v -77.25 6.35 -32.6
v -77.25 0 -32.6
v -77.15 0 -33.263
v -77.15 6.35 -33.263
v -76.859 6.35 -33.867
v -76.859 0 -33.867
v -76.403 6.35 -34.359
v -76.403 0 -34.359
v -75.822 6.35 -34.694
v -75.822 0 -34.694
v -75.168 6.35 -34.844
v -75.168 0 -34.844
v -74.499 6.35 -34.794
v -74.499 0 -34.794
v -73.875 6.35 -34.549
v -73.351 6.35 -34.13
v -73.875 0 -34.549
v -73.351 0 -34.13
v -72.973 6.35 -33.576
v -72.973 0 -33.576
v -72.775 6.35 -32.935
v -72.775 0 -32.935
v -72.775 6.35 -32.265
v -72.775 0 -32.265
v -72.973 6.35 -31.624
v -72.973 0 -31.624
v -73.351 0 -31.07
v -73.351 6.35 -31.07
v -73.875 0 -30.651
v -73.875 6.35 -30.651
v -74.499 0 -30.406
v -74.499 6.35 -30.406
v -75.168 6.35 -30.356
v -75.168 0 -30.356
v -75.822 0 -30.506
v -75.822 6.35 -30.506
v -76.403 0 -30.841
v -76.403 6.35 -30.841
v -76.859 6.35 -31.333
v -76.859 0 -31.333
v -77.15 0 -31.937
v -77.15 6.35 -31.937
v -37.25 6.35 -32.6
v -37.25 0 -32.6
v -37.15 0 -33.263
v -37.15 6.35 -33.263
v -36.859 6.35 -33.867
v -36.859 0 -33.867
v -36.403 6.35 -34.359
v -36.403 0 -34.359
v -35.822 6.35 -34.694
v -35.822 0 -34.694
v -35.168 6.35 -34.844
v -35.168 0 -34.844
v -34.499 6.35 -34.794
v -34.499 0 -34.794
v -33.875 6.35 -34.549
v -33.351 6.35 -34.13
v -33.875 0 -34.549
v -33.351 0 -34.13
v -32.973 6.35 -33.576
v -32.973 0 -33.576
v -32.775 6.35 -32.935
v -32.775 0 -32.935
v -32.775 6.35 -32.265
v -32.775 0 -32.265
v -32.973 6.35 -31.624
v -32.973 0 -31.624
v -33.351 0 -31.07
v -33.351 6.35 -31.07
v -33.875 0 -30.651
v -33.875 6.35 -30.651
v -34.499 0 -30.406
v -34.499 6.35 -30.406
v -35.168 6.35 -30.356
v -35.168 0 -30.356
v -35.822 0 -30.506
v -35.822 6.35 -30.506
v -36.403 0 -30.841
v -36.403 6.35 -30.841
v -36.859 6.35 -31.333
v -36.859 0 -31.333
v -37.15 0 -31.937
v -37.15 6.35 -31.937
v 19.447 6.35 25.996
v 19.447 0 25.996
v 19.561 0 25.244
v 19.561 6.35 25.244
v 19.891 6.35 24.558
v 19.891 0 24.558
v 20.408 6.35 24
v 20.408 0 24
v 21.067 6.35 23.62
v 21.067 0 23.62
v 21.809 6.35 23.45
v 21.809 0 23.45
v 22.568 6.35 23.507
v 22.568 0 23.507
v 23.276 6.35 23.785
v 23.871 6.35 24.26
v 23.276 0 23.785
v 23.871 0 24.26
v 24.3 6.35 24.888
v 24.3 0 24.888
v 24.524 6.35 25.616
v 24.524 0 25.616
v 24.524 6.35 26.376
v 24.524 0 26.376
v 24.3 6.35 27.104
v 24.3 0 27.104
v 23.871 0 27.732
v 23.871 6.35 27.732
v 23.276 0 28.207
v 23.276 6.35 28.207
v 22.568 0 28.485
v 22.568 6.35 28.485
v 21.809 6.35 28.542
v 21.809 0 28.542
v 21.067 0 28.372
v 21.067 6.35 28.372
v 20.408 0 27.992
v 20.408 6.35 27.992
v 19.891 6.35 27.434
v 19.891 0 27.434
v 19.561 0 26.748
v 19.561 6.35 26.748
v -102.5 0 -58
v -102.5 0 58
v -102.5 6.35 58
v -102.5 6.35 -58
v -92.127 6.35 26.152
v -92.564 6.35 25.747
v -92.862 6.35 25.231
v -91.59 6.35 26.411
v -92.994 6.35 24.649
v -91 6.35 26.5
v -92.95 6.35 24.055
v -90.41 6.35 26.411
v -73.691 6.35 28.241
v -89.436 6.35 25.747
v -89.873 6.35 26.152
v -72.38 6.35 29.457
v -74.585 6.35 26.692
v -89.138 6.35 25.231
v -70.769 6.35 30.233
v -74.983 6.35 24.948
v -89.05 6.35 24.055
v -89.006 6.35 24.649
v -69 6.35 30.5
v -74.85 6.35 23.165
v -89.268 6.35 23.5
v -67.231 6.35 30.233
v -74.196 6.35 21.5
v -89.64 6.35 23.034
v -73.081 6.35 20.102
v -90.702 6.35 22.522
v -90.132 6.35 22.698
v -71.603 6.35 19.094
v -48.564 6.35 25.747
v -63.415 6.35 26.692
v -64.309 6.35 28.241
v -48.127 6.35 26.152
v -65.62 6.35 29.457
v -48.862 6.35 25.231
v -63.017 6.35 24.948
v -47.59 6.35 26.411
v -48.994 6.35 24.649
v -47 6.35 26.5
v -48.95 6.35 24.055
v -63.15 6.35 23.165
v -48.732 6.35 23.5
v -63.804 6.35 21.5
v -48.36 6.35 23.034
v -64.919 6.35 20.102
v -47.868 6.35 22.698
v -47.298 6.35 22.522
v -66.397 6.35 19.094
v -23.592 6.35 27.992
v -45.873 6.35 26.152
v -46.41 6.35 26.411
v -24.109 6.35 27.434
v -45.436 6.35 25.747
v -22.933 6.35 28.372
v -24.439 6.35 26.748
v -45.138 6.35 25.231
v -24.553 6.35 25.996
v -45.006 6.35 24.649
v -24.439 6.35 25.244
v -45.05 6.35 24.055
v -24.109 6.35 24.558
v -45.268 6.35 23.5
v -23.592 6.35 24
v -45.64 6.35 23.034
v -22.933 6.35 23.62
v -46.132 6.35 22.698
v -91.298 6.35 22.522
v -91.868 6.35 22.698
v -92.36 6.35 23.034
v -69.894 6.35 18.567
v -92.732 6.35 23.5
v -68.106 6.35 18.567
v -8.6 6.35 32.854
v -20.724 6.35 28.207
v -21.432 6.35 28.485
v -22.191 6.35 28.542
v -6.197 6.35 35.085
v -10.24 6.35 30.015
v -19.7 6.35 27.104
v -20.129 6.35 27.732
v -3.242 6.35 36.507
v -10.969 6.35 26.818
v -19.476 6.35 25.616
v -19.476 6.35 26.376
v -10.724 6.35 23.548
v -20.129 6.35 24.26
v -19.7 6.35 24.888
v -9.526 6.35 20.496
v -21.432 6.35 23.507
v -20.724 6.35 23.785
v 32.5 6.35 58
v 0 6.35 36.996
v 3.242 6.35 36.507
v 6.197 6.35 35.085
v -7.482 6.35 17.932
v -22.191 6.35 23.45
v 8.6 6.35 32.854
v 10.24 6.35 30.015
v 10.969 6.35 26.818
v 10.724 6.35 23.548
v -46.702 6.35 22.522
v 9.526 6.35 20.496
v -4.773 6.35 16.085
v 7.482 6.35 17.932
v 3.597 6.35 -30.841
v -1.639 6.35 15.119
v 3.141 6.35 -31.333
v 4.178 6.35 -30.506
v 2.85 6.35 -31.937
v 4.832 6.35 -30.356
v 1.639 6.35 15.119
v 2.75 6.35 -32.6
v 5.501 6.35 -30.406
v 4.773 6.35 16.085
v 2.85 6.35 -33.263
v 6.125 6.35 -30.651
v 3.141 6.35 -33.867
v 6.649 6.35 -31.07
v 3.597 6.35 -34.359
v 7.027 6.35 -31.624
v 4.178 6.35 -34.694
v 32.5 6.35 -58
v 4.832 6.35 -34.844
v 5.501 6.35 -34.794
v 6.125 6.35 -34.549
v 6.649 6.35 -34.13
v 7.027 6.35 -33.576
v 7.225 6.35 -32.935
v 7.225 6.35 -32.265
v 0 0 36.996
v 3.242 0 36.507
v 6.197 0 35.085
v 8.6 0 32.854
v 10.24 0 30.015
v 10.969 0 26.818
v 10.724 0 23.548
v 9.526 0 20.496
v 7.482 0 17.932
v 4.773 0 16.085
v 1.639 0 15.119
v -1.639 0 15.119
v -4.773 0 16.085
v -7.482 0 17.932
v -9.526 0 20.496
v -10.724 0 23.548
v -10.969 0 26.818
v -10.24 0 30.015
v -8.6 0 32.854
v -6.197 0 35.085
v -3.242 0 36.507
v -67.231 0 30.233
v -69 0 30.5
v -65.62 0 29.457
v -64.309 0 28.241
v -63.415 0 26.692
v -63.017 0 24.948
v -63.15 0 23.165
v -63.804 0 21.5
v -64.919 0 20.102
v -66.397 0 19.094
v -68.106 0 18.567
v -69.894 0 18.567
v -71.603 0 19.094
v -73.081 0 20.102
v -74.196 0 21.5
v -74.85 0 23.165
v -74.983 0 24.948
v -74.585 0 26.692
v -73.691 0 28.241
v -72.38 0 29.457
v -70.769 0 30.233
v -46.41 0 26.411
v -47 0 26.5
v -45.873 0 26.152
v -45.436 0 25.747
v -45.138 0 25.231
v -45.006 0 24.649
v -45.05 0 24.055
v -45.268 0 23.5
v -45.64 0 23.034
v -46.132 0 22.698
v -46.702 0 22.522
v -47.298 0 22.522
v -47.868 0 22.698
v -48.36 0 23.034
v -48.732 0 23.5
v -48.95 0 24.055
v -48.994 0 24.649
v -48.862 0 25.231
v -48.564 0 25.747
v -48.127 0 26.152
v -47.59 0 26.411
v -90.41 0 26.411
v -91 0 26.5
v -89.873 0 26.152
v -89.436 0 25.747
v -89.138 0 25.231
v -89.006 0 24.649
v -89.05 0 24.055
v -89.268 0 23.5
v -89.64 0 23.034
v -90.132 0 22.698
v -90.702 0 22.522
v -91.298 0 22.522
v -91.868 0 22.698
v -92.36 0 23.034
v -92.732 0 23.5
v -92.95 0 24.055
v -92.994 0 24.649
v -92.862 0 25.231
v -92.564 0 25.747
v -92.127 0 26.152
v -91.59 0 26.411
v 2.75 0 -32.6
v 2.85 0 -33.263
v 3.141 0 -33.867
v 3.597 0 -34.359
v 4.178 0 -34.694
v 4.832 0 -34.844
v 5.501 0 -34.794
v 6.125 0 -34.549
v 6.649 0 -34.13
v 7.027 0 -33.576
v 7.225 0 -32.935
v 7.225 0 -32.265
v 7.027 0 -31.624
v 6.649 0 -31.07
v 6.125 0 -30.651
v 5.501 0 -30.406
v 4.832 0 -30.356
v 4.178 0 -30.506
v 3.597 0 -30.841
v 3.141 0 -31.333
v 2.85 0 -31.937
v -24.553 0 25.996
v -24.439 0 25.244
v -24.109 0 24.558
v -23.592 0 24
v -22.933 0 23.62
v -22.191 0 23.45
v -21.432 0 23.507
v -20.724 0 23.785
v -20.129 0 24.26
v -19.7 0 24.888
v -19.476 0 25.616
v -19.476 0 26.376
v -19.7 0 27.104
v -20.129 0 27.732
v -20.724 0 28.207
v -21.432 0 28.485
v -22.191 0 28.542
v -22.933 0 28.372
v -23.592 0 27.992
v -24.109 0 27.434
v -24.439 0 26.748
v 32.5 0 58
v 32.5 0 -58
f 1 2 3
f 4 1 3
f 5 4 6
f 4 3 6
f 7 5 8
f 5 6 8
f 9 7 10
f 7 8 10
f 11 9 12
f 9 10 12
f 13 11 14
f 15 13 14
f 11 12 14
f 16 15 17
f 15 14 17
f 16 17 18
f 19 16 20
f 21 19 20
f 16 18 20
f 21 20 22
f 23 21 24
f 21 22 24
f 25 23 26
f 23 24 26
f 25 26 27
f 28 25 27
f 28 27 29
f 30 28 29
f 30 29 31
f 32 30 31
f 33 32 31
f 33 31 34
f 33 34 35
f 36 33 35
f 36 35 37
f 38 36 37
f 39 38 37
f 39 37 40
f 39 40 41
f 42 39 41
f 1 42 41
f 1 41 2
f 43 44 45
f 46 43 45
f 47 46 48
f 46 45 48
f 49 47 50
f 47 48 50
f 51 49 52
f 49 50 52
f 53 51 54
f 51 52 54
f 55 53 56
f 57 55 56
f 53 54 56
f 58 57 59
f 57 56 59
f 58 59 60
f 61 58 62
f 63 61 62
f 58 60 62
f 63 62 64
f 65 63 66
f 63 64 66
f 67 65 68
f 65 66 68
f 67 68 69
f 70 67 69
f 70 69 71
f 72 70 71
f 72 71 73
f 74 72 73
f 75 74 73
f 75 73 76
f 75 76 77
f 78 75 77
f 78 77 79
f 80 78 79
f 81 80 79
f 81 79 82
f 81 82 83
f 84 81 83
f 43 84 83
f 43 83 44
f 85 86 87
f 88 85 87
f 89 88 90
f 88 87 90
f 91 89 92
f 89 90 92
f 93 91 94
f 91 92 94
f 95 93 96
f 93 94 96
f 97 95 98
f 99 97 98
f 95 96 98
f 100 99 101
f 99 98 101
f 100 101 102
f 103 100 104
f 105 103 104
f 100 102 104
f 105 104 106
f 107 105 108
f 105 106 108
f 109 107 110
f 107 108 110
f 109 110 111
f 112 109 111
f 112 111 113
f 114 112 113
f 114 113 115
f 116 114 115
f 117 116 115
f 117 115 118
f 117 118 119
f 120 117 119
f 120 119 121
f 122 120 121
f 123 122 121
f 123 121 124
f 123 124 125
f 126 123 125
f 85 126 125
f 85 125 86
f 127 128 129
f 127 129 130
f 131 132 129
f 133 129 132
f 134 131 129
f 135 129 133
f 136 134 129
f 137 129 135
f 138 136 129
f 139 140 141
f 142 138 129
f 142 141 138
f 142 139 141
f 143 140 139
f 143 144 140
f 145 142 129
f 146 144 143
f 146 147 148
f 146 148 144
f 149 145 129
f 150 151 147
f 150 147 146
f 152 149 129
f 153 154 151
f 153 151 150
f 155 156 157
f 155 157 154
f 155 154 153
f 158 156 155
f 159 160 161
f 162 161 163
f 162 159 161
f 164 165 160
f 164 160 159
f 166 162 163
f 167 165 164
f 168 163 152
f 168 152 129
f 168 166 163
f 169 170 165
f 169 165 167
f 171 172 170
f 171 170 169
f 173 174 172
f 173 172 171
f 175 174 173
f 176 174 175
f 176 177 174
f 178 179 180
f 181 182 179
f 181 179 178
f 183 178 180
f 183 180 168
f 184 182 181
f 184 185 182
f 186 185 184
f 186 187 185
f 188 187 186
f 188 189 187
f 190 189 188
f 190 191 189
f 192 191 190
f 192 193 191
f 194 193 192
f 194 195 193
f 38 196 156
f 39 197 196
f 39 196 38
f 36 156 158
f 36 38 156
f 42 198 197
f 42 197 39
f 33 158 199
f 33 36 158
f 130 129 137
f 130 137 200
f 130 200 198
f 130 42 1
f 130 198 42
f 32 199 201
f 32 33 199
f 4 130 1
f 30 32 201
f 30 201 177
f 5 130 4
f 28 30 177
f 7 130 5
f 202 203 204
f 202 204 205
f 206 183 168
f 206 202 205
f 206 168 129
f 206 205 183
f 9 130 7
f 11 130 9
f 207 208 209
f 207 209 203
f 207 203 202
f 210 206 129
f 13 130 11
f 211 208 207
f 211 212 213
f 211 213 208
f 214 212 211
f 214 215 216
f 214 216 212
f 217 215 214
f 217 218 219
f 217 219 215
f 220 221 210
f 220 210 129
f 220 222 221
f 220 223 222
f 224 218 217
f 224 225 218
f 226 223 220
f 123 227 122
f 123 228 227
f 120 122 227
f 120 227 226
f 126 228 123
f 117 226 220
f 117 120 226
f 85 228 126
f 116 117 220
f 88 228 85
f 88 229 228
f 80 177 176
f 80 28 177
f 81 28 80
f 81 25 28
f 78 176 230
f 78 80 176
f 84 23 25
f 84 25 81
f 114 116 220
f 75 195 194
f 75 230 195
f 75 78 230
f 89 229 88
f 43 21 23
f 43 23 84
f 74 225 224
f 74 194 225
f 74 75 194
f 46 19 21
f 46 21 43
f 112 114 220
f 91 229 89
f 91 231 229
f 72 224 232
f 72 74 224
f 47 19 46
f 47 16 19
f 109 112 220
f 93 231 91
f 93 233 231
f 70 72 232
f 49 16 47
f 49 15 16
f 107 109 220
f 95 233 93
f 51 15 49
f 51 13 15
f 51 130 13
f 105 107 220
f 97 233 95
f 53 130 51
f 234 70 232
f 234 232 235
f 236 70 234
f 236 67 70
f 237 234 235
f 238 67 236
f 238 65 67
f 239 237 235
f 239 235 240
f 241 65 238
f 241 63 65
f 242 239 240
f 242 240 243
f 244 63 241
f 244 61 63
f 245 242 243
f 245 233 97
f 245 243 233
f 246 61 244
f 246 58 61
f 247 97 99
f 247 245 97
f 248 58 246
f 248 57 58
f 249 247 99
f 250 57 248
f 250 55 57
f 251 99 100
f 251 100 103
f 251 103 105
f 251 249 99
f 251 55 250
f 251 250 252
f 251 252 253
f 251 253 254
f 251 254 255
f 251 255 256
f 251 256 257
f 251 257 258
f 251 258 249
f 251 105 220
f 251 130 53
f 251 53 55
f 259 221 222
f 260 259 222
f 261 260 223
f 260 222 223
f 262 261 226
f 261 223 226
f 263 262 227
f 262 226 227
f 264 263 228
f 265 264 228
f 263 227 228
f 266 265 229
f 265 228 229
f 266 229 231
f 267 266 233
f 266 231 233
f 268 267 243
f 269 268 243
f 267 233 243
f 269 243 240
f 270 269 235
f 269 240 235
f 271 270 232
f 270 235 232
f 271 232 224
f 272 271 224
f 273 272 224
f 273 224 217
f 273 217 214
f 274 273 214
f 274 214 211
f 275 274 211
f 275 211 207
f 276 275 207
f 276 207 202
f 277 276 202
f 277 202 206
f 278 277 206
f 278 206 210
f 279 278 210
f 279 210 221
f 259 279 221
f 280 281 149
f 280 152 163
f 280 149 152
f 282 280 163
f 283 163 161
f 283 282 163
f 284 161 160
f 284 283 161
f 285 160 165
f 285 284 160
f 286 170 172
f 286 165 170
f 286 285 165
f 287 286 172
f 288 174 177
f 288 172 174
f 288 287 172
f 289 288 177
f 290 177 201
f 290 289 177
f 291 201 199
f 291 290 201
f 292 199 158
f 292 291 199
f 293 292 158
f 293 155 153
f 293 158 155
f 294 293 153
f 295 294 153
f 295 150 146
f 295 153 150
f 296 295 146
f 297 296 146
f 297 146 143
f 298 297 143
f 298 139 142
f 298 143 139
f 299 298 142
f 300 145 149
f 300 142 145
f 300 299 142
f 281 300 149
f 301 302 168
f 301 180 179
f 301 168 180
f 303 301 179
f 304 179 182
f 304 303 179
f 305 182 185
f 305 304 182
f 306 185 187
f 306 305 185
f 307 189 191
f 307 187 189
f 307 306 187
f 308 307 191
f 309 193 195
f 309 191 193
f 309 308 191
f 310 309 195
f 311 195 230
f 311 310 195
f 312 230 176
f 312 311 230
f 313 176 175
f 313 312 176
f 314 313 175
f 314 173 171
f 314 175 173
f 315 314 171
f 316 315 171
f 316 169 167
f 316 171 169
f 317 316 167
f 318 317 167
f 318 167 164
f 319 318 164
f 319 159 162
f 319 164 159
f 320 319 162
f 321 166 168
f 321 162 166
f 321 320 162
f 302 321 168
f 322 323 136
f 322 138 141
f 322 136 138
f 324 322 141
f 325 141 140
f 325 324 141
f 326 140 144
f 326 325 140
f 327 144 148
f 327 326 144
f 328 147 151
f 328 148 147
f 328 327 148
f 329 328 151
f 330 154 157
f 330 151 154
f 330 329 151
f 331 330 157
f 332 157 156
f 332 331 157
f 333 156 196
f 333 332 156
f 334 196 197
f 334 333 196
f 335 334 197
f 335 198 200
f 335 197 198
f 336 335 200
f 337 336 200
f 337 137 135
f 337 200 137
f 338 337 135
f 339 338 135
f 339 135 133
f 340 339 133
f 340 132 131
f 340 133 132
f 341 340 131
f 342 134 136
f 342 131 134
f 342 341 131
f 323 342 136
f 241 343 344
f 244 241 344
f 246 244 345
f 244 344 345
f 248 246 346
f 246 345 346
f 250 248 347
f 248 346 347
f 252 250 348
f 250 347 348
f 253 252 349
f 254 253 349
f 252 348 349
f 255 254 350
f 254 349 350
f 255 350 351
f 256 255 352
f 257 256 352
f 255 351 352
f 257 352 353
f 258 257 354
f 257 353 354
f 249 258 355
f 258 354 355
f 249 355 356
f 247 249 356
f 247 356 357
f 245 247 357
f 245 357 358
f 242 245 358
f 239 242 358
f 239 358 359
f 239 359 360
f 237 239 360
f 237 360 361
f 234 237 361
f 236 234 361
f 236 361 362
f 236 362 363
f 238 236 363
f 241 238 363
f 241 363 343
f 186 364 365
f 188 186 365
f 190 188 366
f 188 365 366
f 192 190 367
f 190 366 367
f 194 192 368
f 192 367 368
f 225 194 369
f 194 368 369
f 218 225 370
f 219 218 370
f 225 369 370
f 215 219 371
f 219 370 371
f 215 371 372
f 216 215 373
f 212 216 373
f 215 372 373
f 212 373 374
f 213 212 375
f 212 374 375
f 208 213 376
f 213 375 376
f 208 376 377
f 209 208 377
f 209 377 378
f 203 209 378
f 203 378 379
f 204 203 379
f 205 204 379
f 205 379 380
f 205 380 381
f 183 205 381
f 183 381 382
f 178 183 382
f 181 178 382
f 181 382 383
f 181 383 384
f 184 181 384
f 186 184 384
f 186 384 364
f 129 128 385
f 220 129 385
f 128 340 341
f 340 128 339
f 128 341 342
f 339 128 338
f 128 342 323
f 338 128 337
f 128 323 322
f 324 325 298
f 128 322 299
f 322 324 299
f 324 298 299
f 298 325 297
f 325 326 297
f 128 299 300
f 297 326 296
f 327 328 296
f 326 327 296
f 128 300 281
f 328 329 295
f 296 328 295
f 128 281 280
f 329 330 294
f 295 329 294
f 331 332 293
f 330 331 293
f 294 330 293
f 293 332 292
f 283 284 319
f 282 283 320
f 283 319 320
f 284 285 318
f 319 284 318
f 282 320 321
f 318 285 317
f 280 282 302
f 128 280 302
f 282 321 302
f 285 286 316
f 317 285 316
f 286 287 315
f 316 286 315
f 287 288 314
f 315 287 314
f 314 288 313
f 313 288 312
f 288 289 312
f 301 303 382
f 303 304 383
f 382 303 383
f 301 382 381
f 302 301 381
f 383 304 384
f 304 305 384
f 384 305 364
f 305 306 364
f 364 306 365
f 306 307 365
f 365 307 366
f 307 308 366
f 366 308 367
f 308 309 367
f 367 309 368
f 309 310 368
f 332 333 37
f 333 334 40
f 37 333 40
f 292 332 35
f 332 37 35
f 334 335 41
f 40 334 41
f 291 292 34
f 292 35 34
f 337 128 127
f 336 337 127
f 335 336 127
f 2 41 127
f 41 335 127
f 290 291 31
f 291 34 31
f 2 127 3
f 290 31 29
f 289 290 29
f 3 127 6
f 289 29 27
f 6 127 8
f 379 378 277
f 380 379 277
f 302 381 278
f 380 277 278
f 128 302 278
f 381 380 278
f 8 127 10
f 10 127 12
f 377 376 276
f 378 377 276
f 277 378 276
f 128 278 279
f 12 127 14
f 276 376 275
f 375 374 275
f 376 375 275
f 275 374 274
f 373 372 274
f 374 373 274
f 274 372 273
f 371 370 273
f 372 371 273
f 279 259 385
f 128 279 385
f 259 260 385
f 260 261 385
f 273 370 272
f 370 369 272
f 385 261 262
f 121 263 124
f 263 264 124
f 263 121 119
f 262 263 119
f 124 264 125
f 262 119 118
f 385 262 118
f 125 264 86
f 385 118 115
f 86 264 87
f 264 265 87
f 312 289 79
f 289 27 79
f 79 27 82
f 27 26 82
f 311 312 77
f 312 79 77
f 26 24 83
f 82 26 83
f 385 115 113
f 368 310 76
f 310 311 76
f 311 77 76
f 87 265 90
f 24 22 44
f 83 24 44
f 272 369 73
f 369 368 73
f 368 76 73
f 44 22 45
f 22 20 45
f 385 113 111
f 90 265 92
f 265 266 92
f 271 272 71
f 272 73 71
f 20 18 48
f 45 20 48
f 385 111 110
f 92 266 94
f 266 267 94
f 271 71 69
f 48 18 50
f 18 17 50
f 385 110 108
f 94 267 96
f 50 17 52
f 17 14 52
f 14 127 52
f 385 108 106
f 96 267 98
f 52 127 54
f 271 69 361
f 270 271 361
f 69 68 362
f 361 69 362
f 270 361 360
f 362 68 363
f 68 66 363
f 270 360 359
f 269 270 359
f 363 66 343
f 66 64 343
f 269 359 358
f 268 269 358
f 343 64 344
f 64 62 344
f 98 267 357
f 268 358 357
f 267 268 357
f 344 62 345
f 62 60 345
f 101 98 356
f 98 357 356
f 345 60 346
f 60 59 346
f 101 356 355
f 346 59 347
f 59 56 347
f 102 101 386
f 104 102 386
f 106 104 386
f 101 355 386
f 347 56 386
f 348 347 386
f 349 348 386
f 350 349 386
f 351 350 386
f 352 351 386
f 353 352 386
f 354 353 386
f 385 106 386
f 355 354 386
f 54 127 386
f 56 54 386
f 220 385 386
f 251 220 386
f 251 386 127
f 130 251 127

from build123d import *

# Parameters (mm, degrees)
SKETCH1_W               = 65
SKETCH1_H               = 116
SKETCH1_W_2             = 70
BOSS_EXTRUDE1_DEPTH     = 6.35
F_10_CLEARANCE_HOLE1_D  = 5.1054
SKETCH9_R               = 11
CUT_EXTRUDE2_DEPTH      = 118.94309009
M4_CLEARANCE_HOLE1_D    = 4.5
CUT_EXTRUDE3_DEPTH      = 118.94309009
CUT_EXTRUDE3_DEPTH_BACK = 118.94309009
SKETCH12_R              = 6
SKETCH12_R_2            = 2


with BuildPart() as part:
    # Sketch1 → Boss-Extrude1 (new body)
    with BuildSketch(Plane(origin=(0, 0, 0), x_dir=(1, 0, 0), z_dir=(0, 1, 0))):
        Rectangle(SKETCH1_W, SKETCH1_H)
        with Locations((-67.5, 0)):
            Rectangle(SKETCH1_W_2, SKETCH1_H)
    extrude(amount=BOSS_EXTRUDE1_DEPTH)

    # #10 Clearance Hole1 (through all)
    with Locations(Plane(origin=(0, 6.35, 0), x_dir=(1, 0, 0), z_dir=(0, 1, 0))):
        with Locations((-22, -25.996), (22, -25.996)):
            Hole(F_10_CLEARANCE_HOLE1_D / 2)

    # Sketch9 → Cut-Extrude2 (cut, through all)
    with BuildSketch(Plane(origin=(0, 6.35, 0), x_dir=(1, 0, 0), z_dir=(0, 1, 0))):
        with Locations(Location((0, -25.996, 0), (0, 0, 270))):
            Circle(SKETCH9_R)
    extrude(amount=-CUT_EXTRUDE2_DEPTH, mode=Mode.SUBTRACT)

    # M4 Clearance Hole1 (through all)
    with Locations(Plane(origin=(0, 6.35, 0), x_dir=(1, 0, 0), z_dir=(0, 1, 0))):
        with Locations((-75, 32.6), (-35, 32.6), (5, 32.6)):
            Hole(M4_CLEARANCE_HOLE1_D / 2)

    # Sketch12 → Cut-Extrude3 (cut, two sides: drawn at the far end of the back side and taken through both)
    with BuildSketch(Plane(origin=(0, 6.35, 0), x_dir=(1, 0, 0), z_dir=(0, 1, 0)).offset(-CUT_EXTRUDE3_DEPTH_BACK)):
        with Locations(Location((-69, -24.5, 0), (0, 0, 270))):
            Circle(SKETCH12_R)
        with Locations(Location((-91, -24.5, 0), (0, 0, 270))):
            Circle(SKETCH12_R_2)
        with Locations(Location((-47, -24.5, 0), (0, 0, 270))):
            Circle(SKETCH12_R_2)
    extrude(amount=CUT_EXTRUDE3_DEPTH + CUT_EXTRUDE3_DEPTH_BACK, mode=Mode.SUBTRACT)


solid = part.part
